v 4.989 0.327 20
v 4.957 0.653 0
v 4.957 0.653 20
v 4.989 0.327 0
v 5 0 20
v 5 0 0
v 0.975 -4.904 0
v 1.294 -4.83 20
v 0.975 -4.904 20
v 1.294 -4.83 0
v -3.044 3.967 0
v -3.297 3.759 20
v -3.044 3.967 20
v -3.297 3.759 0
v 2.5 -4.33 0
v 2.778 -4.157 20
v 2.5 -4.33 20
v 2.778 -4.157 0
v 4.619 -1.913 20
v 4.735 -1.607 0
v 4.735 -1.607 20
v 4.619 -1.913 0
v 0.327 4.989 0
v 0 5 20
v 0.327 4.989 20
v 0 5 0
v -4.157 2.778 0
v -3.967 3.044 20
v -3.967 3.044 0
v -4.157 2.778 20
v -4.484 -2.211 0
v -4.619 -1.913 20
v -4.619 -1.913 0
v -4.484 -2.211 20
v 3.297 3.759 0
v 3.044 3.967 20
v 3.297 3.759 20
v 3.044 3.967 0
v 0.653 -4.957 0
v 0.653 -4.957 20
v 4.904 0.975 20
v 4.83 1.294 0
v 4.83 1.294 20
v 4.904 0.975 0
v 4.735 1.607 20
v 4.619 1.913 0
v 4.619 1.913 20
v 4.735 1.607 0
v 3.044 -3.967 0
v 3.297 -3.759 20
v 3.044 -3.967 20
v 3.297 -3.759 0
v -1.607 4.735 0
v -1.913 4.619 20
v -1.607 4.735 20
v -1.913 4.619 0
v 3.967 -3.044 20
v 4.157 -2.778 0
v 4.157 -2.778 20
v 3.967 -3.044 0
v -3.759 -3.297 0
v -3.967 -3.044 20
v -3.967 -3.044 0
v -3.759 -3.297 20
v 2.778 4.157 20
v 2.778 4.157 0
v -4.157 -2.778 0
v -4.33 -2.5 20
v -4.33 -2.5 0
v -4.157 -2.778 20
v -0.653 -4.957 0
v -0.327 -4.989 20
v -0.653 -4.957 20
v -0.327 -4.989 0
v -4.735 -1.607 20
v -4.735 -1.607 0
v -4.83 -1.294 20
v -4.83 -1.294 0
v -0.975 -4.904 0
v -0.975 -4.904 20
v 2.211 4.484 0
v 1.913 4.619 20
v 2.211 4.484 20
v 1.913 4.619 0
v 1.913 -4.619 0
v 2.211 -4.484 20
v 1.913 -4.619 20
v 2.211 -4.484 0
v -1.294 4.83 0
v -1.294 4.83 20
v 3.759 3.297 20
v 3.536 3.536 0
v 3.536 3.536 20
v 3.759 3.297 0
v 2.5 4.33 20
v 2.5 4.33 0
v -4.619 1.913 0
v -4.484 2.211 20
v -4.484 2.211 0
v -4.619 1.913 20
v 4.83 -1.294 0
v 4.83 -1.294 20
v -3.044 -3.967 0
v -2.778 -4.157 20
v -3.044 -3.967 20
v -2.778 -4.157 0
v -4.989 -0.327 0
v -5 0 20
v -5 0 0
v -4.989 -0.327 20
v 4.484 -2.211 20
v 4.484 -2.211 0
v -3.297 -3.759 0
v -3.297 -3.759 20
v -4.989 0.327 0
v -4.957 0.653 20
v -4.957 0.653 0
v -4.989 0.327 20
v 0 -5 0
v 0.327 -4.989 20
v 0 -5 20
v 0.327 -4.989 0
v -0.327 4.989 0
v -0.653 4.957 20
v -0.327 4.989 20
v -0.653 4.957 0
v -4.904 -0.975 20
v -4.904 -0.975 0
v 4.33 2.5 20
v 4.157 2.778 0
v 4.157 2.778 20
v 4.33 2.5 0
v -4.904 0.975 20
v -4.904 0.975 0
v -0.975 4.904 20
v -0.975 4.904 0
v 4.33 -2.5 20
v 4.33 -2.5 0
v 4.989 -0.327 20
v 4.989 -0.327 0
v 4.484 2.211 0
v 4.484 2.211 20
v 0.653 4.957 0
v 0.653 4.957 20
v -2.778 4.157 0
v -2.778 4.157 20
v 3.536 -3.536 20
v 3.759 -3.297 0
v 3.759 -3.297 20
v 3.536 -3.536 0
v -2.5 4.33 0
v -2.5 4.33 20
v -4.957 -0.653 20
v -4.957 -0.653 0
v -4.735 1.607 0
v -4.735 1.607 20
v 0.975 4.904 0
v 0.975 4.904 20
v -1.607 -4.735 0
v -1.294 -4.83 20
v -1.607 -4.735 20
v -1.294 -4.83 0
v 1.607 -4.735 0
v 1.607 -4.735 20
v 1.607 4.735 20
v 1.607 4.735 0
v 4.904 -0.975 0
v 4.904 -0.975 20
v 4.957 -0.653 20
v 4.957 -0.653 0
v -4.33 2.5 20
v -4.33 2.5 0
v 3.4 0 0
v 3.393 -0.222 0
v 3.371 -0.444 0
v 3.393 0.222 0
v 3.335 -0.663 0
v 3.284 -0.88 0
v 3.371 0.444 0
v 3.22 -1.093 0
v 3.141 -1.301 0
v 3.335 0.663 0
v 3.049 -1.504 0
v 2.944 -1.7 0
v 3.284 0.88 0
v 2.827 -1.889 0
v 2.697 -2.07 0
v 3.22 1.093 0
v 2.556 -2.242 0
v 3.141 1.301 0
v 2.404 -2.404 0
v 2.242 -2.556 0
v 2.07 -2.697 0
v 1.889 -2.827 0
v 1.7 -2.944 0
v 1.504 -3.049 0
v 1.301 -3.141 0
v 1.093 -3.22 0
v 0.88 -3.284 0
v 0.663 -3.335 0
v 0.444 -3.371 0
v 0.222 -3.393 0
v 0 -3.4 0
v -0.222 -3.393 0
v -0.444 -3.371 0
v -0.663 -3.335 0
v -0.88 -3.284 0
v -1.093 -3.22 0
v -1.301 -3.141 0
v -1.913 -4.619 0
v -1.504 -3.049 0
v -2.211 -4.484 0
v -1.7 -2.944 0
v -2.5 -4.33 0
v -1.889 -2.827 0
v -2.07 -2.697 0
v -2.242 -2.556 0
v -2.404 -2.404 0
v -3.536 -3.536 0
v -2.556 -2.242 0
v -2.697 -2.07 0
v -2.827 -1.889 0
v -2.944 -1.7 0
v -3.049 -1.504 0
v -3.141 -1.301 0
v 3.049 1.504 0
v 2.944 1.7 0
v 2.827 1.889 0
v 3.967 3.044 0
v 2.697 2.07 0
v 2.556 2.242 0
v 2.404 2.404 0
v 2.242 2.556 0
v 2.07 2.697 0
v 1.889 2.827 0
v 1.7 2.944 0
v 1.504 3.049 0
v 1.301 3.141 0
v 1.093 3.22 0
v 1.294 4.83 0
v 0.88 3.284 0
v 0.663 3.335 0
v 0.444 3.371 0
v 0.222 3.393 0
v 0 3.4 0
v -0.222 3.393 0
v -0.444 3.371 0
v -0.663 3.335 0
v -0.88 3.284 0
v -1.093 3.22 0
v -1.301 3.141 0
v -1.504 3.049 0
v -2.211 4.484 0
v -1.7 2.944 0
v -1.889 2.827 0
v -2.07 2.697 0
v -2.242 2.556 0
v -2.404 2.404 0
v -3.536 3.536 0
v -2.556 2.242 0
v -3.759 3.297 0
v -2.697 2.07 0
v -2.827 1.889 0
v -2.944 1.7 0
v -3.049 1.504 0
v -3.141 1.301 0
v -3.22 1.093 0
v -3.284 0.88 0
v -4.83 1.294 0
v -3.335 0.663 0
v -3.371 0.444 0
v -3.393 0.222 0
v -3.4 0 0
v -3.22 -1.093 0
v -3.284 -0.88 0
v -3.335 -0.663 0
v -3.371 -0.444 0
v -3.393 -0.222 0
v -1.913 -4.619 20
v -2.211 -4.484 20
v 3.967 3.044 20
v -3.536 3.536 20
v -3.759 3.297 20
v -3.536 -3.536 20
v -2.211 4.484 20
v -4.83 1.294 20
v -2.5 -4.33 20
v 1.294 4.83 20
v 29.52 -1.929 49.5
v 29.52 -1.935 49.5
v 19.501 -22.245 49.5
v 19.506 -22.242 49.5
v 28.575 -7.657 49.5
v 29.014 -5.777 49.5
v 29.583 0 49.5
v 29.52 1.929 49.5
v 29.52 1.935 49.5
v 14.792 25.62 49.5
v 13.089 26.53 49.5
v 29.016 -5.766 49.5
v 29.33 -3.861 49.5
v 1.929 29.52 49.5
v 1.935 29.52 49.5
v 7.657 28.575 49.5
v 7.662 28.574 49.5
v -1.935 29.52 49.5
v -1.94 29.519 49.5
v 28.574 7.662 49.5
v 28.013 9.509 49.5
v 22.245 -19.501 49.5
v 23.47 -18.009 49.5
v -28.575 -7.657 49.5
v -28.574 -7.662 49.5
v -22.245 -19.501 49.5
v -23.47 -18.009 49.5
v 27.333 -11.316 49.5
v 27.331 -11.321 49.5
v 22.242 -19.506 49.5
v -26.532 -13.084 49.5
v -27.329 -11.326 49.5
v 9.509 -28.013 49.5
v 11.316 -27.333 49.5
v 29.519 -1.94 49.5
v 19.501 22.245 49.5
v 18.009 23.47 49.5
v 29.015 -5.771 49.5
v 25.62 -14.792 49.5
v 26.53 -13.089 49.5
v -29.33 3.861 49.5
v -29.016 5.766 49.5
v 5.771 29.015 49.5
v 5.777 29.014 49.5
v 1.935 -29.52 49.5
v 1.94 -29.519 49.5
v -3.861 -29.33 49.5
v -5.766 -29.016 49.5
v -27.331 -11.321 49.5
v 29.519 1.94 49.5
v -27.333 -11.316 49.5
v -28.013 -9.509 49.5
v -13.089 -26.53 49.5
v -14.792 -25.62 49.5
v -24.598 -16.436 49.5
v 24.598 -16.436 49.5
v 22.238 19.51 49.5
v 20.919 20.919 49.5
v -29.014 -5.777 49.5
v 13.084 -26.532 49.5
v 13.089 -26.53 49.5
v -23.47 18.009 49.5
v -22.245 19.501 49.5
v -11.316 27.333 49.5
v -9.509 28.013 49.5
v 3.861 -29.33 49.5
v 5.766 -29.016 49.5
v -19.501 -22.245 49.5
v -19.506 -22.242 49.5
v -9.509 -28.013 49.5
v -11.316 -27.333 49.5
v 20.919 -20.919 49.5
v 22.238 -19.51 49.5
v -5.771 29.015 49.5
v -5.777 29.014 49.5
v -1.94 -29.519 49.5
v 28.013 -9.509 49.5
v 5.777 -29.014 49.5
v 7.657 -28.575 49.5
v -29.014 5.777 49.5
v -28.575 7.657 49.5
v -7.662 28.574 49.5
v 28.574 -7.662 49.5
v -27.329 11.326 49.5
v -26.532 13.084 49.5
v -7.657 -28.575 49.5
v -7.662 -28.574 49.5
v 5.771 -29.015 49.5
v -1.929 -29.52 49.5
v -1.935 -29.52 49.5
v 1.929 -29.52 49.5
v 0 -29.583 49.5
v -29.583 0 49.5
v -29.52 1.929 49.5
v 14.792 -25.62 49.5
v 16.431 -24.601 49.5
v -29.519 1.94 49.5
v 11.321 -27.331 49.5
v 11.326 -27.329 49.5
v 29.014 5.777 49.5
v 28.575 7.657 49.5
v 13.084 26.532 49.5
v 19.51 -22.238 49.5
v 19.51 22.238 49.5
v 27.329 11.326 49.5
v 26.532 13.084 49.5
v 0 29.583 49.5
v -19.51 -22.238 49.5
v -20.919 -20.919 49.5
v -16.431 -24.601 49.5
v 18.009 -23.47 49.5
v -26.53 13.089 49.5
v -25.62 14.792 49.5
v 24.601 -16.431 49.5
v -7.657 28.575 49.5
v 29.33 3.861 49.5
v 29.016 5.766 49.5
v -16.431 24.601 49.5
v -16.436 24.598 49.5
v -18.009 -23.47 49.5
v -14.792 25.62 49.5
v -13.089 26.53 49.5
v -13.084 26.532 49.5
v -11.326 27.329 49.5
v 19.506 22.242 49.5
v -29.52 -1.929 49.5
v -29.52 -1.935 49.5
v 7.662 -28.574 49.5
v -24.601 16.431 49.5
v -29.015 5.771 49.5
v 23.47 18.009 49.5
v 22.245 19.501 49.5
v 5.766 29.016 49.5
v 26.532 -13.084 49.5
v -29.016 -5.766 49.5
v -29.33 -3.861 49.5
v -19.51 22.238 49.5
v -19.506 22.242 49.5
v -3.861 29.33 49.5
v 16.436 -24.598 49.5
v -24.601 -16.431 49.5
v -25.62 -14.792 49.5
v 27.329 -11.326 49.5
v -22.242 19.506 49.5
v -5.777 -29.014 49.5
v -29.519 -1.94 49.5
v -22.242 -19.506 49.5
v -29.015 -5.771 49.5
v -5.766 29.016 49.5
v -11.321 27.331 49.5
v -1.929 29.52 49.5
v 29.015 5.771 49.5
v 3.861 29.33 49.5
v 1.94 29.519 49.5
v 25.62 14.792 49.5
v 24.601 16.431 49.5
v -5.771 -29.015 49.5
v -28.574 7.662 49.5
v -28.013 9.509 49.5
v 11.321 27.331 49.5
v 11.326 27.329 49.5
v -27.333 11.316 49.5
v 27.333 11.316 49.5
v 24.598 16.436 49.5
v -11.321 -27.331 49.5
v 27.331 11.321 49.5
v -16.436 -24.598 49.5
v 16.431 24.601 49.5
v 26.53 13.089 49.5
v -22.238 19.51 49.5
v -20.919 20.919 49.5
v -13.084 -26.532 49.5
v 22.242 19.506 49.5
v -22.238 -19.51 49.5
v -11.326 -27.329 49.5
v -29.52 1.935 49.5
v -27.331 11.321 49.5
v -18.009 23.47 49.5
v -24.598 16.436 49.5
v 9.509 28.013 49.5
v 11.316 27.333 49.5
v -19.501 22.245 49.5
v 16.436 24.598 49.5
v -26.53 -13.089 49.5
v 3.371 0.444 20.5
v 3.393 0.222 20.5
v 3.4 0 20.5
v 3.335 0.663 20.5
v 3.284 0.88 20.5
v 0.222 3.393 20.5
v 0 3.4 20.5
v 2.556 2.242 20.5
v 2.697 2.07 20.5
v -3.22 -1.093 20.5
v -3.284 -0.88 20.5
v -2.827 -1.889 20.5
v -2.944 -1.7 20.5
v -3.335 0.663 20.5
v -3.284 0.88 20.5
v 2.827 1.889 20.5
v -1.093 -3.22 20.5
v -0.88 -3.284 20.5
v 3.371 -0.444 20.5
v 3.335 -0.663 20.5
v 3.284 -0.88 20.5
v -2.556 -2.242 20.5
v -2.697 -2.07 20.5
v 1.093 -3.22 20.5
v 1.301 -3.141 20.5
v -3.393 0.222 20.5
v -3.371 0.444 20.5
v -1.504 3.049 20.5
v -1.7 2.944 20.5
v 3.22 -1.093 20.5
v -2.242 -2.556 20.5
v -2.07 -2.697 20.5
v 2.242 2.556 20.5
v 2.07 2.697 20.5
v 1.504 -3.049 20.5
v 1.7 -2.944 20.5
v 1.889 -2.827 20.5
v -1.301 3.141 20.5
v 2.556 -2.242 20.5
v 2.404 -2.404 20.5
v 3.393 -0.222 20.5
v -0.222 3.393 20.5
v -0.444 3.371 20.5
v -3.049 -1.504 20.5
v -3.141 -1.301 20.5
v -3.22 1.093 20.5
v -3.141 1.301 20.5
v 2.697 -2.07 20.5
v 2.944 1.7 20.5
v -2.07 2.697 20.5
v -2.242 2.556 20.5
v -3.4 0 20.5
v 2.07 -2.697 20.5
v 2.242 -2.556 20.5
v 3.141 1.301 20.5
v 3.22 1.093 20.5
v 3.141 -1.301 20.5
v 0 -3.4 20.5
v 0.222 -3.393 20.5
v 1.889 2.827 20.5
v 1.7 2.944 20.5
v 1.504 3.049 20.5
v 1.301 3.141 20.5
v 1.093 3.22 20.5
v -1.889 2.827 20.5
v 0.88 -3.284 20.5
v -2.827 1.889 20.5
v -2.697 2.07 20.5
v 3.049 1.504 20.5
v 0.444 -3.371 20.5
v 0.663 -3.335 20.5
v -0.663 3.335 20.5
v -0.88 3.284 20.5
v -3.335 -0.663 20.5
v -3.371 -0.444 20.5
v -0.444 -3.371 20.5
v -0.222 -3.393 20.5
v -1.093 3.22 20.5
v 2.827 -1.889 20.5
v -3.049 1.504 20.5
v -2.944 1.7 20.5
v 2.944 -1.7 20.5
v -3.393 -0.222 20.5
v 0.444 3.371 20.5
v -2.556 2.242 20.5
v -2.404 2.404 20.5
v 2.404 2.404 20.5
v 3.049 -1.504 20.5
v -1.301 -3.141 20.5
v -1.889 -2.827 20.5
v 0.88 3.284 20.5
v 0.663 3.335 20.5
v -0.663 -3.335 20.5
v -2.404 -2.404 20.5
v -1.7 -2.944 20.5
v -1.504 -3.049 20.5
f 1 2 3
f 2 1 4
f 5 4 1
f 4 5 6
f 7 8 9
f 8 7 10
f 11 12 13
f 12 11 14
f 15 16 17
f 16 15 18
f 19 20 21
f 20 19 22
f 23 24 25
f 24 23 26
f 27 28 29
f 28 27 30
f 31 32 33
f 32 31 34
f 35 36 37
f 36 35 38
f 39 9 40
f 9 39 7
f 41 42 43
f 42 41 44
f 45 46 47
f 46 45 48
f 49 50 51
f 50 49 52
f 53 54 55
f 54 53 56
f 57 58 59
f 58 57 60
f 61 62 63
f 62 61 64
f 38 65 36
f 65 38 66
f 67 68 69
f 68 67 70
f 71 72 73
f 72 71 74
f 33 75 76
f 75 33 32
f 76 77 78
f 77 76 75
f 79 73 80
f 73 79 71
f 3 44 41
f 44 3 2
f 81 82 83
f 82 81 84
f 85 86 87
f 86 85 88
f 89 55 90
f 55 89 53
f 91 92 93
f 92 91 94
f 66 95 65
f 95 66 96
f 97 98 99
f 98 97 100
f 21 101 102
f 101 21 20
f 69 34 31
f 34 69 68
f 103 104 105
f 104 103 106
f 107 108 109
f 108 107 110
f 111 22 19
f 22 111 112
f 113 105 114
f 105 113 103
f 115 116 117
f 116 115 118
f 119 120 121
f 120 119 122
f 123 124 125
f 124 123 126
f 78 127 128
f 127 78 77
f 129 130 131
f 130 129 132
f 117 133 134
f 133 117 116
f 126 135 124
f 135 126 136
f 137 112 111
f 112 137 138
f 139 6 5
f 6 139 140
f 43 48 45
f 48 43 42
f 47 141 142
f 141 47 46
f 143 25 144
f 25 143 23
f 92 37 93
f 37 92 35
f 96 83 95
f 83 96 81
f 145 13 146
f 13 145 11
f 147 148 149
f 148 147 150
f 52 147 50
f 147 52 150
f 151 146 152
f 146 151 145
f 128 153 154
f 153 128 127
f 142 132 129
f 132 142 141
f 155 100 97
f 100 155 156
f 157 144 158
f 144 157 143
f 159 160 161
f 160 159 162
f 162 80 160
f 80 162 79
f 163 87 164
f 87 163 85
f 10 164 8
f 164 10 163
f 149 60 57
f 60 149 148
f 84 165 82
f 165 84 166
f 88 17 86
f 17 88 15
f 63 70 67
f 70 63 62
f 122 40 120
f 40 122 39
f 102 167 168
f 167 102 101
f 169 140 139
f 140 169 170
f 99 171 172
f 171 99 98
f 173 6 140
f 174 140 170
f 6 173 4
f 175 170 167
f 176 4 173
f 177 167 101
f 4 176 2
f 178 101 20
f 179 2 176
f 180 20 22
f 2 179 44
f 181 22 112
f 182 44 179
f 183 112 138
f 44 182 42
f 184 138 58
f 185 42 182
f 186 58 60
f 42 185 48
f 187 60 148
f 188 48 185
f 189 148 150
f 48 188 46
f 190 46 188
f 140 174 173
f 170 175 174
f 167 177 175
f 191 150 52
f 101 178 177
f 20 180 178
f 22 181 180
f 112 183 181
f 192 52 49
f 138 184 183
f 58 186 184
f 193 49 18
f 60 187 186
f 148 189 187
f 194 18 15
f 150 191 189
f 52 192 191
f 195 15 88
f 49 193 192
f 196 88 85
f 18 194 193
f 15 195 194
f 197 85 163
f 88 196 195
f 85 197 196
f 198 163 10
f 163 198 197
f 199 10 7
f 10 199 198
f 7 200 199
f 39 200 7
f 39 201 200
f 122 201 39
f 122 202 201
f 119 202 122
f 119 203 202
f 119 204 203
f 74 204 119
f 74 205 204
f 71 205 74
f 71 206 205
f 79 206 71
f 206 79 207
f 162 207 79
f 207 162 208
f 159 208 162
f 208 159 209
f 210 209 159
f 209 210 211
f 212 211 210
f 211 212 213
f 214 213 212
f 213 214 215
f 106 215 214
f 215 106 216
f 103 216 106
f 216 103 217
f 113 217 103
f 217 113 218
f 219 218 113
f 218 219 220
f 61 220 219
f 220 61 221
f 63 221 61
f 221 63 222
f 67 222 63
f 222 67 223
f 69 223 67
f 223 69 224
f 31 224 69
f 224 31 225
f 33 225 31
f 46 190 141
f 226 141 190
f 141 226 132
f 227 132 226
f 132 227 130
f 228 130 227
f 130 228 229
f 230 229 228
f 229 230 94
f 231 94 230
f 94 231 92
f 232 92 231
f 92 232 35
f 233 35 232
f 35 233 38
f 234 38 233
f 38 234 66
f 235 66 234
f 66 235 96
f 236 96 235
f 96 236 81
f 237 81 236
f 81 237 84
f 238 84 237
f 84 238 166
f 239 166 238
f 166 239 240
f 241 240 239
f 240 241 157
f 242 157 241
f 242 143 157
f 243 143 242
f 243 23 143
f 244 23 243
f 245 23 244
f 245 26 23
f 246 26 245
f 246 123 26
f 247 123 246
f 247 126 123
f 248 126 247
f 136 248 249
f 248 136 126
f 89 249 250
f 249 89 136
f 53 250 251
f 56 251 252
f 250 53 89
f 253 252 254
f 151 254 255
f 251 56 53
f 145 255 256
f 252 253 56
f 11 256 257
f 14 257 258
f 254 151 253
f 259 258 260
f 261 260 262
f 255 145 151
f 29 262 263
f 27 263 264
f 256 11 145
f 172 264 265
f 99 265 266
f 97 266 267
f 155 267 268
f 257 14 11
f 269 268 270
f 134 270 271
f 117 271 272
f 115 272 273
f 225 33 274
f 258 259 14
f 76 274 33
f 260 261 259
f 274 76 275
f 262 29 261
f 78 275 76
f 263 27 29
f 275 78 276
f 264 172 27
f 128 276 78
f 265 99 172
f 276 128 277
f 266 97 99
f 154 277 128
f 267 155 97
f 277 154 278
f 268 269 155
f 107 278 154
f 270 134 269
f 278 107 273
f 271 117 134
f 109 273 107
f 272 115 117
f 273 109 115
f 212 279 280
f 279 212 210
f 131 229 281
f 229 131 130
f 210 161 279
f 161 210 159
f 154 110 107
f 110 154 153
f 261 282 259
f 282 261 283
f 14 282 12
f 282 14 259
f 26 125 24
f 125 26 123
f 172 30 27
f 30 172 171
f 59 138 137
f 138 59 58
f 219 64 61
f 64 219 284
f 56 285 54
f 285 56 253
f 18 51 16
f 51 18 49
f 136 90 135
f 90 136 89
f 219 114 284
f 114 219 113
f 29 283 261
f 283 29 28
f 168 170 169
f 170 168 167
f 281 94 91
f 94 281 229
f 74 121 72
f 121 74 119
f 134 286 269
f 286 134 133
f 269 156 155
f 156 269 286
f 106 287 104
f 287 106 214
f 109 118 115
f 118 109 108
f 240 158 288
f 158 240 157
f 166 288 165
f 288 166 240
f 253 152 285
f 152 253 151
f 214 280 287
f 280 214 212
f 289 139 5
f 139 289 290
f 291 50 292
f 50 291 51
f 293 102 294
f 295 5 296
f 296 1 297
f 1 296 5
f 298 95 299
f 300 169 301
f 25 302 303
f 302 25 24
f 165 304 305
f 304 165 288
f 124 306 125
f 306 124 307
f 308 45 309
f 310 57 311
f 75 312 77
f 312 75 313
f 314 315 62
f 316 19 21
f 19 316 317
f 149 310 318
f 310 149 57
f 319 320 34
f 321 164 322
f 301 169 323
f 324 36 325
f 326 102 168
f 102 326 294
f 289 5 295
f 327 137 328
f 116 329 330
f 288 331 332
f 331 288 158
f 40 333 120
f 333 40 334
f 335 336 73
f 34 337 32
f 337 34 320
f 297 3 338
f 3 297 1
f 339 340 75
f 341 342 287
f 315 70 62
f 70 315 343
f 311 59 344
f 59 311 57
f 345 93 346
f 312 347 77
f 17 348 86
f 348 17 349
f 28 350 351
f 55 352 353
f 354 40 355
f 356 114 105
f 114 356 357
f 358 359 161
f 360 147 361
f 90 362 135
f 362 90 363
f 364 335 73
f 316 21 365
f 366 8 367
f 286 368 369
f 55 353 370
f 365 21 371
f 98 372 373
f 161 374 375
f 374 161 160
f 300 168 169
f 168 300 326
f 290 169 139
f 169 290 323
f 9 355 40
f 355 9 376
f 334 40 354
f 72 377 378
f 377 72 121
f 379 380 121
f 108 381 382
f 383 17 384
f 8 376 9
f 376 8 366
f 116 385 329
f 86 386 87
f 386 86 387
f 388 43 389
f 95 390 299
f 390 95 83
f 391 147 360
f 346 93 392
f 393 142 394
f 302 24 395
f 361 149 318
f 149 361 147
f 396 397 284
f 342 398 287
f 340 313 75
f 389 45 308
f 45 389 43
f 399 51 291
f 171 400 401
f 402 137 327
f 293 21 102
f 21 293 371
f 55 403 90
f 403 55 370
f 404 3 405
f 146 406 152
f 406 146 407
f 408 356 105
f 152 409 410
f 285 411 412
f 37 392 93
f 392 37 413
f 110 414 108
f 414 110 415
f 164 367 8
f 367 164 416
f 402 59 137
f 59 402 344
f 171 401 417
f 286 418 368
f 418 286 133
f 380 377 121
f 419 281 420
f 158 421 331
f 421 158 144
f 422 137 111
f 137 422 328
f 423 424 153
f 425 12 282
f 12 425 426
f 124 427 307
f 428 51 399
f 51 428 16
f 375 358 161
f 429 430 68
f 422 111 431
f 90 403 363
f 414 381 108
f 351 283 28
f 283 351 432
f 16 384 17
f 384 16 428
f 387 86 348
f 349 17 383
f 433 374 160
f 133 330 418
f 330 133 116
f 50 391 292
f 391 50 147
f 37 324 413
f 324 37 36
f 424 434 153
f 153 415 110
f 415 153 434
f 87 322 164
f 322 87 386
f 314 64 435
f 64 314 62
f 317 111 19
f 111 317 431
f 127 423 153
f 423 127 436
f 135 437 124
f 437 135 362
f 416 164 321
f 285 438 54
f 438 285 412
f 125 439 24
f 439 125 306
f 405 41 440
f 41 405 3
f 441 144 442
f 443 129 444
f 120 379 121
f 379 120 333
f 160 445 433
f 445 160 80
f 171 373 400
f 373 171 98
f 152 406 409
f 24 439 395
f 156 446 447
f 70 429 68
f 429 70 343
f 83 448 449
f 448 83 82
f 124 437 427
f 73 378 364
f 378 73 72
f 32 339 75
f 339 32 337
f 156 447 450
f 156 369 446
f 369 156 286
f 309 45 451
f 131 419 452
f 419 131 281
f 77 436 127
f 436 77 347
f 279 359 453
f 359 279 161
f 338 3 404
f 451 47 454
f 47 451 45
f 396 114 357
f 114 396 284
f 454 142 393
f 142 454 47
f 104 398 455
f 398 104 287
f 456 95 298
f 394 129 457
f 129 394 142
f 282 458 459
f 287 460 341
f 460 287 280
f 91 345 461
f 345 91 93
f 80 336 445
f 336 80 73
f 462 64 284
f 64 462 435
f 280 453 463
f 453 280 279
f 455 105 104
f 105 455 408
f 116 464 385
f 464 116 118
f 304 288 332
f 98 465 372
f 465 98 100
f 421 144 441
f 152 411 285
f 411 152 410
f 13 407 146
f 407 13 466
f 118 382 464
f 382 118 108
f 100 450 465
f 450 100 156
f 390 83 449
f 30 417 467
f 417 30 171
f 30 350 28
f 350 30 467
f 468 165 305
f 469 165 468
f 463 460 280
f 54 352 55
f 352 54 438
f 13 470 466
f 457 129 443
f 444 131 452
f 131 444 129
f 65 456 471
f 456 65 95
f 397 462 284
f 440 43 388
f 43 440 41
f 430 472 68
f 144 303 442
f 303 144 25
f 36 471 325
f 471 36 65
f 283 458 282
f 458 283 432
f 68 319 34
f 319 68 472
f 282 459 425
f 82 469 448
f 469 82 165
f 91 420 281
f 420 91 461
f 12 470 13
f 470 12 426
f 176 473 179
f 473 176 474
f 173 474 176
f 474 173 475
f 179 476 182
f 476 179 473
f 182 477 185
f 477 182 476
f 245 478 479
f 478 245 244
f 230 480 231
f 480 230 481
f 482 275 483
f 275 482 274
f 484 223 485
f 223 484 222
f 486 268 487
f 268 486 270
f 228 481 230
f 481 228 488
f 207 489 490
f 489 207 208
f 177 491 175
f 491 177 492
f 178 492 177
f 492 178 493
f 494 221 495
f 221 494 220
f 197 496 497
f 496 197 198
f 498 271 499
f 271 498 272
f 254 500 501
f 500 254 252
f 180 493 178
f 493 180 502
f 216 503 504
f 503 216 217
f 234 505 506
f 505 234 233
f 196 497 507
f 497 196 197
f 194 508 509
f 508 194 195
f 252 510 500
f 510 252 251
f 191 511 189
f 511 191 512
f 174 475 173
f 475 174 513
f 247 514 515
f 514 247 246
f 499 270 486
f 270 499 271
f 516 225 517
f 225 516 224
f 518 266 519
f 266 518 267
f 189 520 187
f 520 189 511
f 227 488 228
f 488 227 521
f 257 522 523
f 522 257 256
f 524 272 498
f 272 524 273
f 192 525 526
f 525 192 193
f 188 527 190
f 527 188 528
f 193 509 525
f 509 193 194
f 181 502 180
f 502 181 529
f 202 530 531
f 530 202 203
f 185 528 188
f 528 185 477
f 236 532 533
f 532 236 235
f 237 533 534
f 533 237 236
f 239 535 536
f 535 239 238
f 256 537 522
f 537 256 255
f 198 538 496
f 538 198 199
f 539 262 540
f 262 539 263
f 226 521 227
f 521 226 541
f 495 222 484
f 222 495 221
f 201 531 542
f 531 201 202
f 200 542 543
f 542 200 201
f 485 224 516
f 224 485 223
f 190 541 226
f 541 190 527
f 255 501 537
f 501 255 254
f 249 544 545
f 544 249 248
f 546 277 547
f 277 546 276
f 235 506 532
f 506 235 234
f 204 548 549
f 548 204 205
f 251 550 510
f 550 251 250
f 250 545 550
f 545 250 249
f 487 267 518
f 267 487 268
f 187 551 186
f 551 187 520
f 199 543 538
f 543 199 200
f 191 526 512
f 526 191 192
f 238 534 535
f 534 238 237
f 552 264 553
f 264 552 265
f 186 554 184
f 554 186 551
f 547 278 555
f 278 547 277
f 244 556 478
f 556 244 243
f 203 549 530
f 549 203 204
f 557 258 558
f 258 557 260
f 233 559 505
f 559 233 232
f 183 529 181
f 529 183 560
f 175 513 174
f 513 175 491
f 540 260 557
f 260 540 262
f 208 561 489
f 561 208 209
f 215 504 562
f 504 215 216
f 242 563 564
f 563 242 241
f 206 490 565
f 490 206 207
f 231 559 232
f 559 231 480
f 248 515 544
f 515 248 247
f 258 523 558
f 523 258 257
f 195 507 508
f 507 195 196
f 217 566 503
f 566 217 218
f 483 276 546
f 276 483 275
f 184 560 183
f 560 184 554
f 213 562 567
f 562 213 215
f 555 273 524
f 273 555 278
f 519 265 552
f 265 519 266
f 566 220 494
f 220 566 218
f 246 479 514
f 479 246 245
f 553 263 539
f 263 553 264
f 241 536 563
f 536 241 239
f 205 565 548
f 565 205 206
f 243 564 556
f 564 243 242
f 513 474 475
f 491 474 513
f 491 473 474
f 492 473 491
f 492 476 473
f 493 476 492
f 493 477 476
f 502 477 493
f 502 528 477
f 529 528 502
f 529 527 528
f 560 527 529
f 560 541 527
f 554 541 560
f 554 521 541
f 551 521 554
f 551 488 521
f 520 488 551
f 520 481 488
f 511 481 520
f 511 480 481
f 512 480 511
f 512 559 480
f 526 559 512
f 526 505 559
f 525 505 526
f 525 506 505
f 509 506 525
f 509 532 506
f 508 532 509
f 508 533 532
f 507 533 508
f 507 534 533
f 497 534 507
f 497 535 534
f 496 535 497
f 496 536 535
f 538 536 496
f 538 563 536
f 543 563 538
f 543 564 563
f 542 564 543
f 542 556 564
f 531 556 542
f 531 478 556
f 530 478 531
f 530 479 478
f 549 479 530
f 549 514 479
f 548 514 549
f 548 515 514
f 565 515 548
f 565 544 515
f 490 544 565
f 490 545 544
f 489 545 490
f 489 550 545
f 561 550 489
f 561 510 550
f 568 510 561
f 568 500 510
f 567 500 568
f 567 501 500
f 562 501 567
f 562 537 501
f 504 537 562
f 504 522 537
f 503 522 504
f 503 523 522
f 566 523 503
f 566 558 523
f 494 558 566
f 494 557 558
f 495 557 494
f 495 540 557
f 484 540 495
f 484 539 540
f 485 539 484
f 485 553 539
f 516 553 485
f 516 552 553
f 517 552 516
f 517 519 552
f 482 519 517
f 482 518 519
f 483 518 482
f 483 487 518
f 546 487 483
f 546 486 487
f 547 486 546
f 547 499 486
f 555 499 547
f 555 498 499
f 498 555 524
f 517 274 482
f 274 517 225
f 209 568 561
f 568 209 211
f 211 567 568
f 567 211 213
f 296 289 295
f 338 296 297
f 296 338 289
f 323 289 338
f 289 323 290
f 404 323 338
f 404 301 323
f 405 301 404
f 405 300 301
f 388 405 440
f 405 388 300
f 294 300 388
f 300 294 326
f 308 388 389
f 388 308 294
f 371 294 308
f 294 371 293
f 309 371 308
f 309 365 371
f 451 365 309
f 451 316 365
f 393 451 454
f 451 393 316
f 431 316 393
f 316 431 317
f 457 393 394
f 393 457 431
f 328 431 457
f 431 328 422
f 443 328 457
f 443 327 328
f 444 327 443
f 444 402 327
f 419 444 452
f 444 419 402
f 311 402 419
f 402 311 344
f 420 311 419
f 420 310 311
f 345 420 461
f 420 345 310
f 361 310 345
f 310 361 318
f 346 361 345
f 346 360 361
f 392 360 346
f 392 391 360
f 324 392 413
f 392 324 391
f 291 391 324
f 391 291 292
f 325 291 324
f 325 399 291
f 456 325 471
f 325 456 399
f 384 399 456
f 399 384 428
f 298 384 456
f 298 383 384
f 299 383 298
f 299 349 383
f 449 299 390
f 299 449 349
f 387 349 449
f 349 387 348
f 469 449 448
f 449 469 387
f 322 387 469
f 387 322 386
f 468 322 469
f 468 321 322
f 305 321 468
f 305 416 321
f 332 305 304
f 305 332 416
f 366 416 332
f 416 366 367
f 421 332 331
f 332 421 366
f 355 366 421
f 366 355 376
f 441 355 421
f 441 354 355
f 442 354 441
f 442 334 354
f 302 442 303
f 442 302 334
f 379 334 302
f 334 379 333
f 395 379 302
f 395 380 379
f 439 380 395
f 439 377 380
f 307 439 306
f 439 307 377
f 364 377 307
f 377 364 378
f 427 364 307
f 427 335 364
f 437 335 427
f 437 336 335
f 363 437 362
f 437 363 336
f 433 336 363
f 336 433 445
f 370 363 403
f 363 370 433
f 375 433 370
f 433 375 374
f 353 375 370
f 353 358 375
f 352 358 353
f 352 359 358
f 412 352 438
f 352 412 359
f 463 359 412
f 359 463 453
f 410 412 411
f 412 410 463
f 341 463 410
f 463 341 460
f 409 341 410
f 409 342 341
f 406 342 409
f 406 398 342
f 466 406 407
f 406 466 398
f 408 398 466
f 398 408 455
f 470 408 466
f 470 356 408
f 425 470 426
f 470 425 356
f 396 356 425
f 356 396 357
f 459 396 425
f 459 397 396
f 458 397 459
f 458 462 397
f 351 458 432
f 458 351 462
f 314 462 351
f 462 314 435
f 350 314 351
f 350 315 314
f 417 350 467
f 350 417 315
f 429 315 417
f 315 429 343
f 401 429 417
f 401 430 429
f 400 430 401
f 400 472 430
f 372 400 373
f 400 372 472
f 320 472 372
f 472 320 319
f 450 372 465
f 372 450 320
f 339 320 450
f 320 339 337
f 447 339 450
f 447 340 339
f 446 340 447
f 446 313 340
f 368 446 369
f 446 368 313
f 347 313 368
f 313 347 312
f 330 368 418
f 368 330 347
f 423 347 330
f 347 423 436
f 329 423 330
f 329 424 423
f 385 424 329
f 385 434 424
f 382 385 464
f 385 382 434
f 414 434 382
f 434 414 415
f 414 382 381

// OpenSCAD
// Lab funnel - printed upright, open at top and bottom
// Units: mm

$fn = 96;

// --- Dimensions ---
spout_od      = 10;    // spout outer diameter
spout_id      = spout_od - 2 * 1.6;  // spout bore (6.8 mm)
spout_h       = 20;    // spout height (z = 0 to 20)
cone_bottom_d = spout_od;  // cone starts at spout diameter
cone_top_d    = 60;    // cone rim diameter
cone_h        = 30;    // cone height (z = 20 to 50)
wall          = 1.6;   // wall thickness
eps           = 0.5;   // cutter overshoot

difference() {
    union() {
        // Spout
        cylinder(d = spout_od, h = spout_h);
        // Cone
        translate([0, 0, spout_h])
            cylinder(d1 = cone_bottom_d, d2 = cone_top_d, h = cone_h);
    }
    // Bottom cutter (through spout)
    translate([0, 0, -eps])
        cylinder(d = spout_id, h = spout_h + 2 * eps);
    // Top cutter (open rim)
    translate([0, 0, spout_h + cone_h - eps])
        cylinder(d = cone_top_d, h = cone_h + eps);
}
